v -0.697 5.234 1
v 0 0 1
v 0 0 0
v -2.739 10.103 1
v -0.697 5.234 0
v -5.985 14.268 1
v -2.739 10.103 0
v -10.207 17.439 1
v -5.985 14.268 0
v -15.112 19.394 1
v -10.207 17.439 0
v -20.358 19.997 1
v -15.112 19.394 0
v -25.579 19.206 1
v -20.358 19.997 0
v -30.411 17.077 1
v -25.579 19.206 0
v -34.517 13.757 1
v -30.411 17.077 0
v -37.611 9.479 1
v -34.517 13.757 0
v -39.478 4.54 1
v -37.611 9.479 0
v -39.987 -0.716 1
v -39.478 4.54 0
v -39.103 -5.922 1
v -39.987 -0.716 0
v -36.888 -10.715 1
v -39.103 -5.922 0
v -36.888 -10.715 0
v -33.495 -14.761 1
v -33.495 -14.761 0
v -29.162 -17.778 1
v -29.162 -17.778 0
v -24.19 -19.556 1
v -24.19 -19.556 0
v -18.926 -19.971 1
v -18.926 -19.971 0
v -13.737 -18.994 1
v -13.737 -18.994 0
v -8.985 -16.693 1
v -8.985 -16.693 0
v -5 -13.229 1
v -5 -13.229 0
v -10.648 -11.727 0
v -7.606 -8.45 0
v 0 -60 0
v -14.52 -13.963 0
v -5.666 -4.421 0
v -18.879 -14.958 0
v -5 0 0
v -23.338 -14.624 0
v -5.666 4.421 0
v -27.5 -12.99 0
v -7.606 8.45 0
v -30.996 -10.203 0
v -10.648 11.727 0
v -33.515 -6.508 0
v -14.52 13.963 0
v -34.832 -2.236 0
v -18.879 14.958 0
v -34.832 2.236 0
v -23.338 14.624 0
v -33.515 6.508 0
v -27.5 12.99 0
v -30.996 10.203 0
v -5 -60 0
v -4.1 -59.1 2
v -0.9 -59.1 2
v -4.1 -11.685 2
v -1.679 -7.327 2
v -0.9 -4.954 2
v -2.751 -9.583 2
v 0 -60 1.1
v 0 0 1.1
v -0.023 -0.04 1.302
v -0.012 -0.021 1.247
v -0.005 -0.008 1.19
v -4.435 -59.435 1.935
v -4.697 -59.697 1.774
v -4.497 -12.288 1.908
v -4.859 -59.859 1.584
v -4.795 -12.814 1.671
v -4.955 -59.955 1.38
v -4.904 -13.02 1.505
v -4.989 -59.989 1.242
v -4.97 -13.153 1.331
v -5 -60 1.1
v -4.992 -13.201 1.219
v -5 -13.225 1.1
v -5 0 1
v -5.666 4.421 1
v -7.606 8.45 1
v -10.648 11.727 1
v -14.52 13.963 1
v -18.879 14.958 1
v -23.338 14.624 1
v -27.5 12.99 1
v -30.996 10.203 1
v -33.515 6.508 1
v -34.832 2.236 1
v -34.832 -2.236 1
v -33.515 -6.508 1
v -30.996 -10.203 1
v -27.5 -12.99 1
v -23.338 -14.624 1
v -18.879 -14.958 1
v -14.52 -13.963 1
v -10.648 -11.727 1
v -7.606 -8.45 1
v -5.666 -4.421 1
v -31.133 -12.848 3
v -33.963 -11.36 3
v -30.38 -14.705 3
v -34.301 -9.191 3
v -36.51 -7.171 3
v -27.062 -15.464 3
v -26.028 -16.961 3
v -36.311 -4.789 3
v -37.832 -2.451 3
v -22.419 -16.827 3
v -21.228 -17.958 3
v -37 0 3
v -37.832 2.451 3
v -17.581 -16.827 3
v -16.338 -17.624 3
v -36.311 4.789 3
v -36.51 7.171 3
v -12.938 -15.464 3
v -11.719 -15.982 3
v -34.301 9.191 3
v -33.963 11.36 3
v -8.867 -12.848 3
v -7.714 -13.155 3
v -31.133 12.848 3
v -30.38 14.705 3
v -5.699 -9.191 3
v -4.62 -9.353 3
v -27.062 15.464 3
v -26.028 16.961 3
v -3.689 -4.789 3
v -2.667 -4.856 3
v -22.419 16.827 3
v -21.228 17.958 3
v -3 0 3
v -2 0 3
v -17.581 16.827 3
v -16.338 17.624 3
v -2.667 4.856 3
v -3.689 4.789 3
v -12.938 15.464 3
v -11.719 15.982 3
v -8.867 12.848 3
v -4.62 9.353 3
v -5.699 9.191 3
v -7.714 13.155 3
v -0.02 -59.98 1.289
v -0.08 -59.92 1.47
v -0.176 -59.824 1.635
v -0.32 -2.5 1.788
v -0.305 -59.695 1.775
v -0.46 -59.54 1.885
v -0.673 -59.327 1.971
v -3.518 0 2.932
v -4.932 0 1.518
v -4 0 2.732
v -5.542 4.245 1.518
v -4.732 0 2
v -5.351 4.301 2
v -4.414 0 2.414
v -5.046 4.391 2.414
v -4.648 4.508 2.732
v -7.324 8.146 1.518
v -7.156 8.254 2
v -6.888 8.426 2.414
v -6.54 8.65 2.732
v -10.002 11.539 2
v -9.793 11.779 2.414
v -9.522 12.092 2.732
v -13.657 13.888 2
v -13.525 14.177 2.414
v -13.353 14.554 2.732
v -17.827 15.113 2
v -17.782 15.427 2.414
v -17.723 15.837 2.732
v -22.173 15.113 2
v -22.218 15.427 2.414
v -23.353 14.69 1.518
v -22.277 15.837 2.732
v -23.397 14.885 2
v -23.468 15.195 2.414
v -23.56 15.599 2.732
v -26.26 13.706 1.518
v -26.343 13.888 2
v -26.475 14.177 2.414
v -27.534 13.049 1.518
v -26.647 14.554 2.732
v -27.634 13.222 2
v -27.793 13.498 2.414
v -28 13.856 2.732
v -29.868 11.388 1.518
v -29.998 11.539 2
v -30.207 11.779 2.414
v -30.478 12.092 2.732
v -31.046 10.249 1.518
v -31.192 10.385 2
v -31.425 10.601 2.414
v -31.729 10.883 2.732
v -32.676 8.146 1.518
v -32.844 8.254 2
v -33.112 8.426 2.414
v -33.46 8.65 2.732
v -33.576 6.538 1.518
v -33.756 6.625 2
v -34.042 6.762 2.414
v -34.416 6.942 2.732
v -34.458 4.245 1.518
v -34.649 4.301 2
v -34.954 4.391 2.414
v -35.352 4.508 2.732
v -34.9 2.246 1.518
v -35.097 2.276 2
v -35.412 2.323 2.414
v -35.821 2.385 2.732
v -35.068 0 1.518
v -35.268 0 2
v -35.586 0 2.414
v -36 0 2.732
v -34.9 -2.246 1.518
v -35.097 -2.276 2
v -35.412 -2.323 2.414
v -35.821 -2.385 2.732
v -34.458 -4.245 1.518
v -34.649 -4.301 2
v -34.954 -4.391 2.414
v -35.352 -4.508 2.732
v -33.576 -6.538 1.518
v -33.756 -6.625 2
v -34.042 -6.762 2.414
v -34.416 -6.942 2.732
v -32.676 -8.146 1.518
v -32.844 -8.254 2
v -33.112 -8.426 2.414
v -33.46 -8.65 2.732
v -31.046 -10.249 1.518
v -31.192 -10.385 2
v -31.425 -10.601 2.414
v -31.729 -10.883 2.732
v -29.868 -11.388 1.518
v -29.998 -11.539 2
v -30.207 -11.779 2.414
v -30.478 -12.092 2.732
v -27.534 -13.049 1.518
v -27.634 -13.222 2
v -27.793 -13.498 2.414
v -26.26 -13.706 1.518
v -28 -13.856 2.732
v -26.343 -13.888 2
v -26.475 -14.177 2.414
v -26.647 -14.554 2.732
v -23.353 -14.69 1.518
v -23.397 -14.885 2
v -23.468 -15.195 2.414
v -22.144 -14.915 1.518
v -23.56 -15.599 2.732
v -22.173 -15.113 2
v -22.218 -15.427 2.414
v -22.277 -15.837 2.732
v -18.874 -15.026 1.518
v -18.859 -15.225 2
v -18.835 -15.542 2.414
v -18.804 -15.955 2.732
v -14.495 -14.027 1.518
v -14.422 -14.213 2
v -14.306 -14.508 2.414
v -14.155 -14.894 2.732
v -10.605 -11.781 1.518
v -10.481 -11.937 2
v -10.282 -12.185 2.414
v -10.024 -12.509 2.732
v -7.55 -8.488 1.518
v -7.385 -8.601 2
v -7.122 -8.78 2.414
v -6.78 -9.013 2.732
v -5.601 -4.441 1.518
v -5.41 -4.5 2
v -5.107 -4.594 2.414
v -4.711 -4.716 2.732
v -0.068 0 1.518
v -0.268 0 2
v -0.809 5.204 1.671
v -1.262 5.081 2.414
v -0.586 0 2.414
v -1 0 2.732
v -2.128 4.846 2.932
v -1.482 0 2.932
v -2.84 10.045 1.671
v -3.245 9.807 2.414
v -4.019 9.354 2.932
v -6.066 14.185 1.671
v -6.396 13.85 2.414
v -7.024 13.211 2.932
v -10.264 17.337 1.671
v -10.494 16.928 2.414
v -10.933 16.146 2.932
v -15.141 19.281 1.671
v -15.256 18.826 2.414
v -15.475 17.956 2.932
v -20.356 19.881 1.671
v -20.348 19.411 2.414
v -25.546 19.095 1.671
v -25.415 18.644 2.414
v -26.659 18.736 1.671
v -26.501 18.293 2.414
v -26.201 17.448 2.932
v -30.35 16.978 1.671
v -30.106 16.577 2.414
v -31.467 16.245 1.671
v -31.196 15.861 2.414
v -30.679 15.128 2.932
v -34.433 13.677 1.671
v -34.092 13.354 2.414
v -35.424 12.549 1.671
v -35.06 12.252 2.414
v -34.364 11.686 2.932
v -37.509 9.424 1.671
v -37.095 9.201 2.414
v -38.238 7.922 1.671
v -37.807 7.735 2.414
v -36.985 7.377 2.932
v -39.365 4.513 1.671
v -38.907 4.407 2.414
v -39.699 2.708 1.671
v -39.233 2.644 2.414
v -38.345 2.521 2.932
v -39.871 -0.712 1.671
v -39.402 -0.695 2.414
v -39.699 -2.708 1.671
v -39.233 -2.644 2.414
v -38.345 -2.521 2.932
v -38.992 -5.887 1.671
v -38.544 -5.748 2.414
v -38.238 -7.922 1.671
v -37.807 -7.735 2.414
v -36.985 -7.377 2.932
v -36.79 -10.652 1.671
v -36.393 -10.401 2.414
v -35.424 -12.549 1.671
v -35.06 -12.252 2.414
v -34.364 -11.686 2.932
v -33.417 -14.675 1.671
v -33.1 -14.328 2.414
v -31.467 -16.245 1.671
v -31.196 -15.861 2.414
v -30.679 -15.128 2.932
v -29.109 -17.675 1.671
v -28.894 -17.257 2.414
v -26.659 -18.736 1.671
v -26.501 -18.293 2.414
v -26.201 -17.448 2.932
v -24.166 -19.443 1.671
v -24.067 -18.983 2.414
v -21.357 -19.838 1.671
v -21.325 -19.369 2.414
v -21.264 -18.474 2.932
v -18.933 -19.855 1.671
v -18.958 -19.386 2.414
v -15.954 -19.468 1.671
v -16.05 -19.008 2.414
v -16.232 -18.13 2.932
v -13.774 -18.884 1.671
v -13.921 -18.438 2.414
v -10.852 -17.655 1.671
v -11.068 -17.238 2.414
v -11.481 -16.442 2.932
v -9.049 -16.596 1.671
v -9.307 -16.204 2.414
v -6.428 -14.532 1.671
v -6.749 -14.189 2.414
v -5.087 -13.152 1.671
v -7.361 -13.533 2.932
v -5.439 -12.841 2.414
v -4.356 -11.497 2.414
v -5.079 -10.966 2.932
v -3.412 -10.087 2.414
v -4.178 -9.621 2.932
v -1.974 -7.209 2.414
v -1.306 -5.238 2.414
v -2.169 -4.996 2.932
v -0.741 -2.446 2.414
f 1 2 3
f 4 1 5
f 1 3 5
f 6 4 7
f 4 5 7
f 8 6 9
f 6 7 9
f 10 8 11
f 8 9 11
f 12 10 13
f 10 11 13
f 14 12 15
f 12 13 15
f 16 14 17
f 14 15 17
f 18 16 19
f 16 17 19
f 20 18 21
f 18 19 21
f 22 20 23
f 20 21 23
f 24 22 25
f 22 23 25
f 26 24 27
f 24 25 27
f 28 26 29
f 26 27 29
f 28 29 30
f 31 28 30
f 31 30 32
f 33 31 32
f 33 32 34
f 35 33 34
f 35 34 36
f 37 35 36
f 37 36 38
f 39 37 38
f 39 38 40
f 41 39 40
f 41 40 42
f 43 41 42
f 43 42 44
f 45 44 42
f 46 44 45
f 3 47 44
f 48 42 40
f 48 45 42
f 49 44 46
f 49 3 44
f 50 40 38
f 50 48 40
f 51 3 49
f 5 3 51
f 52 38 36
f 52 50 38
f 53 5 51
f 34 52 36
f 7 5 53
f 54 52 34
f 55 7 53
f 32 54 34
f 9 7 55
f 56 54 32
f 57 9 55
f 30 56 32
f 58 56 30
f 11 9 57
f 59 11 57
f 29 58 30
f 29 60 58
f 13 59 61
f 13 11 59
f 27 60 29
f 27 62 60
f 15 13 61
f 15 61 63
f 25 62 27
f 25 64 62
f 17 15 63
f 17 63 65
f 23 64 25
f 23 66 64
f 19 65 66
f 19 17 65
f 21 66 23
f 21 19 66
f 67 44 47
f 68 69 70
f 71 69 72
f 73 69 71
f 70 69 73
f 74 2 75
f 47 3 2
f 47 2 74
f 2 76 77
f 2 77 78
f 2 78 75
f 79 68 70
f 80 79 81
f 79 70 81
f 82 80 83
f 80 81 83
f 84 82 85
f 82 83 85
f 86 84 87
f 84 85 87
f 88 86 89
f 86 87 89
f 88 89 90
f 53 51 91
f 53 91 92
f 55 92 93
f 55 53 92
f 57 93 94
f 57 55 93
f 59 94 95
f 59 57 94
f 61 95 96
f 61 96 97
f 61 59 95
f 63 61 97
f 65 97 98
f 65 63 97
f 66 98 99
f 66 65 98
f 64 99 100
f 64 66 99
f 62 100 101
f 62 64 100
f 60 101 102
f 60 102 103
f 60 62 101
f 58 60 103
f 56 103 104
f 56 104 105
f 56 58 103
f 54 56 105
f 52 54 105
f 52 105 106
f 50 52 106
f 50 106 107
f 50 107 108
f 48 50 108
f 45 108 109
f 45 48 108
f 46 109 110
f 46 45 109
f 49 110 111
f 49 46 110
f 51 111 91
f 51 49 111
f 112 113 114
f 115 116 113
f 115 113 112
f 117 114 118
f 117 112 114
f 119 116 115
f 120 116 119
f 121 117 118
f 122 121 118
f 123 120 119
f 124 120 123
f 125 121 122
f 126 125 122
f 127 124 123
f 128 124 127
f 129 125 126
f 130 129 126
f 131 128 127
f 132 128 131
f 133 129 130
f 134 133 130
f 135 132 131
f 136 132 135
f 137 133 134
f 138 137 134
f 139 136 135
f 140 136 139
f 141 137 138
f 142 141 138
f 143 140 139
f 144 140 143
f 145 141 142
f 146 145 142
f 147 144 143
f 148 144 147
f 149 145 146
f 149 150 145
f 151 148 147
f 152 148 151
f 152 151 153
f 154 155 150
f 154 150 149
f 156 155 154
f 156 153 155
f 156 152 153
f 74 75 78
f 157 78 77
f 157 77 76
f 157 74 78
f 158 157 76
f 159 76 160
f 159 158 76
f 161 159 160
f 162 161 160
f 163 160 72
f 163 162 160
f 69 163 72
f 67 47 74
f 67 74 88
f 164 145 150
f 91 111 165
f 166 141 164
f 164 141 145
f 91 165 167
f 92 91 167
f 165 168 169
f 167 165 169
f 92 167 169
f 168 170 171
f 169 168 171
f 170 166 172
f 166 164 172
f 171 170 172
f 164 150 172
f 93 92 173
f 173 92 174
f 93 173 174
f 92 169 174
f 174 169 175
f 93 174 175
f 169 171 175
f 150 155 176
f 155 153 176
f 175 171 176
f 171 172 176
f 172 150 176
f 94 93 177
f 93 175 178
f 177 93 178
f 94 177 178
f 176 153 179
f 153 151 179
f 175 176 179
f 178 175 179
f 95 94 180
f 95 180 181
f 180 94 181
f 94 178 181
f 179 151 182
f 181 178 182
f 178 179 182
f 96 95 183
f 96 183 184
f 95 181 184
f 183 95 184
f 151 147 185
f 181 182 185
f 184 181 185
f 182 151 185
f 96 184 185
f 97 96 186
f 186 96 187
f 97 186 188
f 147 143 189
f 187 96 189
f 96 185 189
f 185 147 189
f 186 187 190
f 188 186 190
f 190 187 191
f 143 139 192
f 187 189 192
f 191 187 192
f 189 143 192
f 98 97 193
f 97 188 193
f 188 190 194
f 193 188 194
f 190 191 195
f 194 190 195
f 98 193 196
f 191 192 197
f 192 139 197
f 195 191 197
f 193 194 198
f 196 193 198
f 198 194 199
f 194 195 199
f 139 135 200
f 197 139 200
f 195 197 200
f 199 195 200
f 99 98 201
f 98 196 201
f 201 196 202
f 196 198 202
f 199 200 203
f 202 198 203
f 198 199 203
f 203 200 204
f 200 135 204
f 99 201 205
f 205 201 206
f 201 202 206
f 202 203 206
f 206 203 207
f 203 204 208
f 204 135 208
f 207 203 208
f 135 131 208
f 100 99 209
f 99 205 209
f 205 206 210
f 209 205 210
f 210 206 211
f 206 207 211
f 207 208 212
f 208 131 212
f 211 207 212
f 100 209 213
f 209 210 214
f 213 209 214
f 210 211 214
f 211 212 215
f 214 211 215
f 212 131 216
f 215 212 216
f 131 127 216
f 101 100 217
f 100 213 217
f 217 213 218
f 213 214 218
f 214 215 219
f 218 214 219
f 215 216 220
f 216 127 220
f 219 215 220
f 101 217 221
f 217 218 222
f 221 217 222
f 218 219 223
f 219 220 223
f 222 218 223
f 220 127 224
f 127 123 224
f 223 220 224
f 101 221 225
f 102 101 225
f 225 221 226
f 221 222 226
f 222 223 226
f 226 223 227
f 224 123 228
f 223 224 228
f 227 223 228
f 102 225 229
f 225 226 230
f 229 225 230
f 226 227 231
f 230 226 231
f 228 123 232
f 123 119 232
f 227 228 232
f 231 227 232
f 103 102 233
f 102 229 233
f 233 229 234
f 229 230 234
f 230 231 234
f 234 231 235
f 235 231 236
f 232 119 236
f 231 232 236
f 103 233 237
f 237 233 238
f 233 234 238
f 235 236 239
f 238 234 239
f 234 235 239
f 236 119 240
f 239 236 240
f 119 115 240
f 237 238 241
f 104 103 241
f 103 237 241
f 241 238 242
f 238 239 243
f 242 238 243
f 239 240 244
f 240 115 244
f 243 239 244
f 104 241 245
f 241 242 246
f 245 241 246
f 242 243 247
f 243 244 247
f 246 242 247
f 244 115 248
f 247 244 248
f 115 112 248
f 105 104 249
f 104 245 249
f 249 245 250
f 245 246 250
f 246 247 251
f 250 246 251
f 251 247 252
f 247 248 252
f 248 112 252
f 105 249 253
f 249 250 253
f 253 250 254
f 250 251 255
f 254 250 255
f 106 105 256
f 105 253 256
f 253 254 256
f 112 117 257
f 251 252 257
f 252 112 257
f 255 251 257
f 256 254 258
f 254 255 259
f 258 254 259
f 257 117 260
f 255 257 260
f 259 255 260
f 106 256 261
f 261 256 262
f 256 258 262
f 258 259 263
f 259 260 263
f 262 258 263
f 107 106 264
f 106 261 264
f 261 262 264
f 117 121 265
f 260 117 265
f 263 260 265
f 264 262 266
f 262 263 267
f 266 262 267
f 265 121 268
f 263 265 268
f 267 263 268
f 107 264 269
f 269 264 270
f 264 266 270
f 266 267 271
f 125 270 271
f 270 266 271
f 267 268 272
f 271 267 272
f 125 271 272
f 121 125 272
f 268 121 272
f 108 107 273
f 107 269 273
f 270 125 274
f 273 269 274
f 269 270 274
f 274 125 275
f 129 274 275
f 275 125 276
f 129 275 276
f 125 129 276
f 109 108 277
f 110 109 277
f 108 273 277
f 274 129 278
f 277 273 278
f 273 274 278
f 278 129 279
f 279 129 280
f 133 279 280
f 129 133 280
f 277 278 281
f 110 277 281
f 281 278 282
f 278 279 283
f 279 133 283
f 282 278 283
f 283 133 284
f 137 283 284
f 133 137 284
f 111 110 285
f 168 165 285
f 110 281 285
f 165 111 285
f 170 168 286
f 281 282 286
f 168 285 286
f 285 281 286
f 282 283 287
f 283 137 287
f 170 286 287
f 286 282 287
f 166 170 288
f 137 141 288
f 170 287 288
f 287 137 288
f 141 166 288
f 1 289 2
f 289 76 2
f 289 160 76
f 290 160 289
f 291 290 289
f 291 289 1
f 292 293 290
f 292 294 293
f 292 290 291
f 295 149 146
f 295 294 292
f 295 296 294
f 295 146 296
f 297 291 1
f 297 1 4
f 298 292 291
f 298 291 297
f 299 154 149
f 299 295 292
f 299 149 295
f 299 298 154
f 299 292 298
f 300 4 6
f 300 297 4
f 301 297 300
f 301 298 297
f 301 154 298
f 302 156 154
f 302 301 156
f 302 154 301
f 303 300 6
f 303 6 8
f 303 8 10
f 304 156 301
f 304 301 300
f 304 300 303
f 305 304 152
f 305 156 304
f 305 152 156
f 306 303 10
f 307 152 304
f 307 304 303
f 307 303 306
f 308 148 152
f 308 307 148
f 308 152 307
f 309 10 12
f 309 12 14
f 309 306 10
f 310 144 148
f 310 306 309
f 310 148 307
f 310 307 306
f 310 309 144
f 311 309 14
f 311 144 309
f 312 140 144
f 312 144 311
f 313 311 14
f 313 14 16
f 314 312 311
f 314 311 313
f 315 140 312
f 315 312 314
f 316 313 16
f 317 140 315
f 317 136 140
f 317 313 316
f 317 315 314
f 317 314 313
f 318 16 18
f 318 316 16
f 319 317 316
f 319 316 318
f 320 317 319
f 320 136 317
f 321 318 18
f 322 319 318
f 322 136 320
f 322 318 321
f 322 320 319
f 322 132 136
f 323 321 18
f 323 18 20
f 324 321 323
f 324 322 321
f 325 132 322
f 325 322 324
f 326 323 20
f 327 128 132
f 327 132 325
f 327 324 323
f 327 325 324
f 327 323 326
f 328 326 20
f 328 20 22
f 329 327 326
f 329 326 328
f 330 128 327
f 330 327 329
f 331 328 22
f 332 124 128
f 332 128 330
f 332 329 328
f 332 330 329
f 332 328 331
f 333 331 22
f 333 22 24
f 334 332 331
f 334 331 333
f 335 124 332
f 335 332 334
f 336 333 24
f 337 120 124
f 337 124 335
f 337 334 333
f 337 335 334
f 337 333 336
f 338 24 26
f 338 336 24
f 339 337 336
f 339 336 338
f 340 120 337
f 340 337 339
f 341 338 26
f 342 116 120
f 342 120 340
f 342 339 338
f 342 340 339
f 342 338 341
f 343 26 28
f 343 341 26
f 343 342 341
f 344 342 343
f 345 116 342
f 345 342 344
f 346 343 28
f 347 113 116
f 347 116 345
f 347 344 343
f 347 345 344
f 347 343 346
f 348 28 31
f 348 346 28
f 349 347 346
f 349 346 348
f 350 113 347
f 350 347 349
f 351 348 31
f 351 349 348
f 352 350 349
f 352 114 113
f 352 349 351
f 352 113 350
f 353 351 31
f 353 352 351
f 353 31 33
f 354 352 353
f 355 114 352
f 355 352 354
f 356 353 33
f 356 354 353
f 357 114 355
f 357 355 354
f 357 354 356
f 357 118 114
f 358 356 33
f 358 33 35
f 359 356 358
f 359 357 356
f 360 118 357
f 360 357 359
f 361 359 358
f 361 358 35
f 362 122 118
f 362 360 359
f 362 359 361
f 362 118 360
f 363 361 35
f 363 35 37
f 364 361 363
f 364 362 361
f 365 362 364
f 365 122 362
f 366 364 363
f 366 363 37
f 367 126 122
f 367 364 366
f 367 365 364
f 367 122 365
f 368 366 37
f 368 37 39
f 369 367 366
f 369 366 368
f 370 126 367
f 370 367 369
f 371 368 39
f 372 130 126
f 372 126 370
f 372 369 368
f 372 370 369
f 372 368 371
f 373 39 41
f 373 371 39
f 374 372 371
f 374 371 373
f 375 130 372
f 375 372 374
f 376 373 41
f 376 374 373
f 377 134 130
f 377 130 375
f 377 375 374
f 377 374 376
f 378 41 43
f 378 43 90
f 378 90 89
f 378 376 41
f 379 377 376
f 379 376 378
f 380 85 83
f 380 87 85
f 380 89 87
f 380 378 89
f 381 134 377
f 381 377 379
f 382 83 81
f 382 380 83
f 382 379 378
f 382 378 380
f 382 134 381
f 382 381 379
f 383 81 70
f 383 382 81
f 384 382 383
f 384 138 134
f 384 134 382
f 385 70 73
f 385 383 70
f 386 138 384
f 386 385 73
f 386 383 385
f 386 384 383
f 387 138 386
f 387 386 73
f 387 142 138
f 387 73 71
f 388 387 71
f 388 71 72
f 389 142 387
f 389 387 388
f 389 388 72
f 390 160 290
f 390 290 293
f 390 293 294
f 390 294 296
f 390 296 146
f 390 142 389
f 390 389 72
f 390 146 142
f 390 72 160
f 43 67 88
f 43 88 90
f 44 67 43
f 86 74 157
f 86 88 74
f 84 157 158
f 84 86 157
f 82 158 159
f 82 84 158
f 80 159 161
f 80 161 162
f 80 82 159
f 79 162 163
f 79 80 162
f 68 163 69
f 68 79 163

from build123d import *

# Parameters (mm, degrees)
SKETCH_R     = 20
SKETCH_R_2   = 15
PAD_DEPTH    = 3
FILLET_R     = 2
PAD001_DEPTH = 2
FILLET001_R  = 0.9


with BuildPart() as part:
    # Sketch → Pad (new body)
    with BuildSketch(Plane.XY):
        with Locations((-20, 0)):
            Circle(SKETCH_R)
        with Locations((-20, 0)):
            Circle(SKETCH_R_2, mode=Mode.SUBTRACT)
    extrude(amount=PAD_DEPTH)

    # Fillet
    fillet_edges = [part.edges().sort_by_distance(p)[0] for p in [
        (-40, 0, 3),
        (-35, 0, 3),
    ]]
    fillet(fillet_edges, radius=FILLET_R)

    # Sketch001 → Pad001 (join)
    with BuildSketch(Plane.XY):
        Polygon((0, 0), (0, -60), (-5, -60), (-5, -8.660254), align=None)
    extrude(amount=PAD001_DEPTH)

    # Fillet001
    fillet001_edges = [part.edges().sort_by_distance(p)[0] for p in [
        (-5, -36.410028, 2),
        (0, -30, 2),
        (-2.5, -60, 2),
    ]]
    fillet(fillet001_edges, radius=FILLET001_R)


solid = part.part
